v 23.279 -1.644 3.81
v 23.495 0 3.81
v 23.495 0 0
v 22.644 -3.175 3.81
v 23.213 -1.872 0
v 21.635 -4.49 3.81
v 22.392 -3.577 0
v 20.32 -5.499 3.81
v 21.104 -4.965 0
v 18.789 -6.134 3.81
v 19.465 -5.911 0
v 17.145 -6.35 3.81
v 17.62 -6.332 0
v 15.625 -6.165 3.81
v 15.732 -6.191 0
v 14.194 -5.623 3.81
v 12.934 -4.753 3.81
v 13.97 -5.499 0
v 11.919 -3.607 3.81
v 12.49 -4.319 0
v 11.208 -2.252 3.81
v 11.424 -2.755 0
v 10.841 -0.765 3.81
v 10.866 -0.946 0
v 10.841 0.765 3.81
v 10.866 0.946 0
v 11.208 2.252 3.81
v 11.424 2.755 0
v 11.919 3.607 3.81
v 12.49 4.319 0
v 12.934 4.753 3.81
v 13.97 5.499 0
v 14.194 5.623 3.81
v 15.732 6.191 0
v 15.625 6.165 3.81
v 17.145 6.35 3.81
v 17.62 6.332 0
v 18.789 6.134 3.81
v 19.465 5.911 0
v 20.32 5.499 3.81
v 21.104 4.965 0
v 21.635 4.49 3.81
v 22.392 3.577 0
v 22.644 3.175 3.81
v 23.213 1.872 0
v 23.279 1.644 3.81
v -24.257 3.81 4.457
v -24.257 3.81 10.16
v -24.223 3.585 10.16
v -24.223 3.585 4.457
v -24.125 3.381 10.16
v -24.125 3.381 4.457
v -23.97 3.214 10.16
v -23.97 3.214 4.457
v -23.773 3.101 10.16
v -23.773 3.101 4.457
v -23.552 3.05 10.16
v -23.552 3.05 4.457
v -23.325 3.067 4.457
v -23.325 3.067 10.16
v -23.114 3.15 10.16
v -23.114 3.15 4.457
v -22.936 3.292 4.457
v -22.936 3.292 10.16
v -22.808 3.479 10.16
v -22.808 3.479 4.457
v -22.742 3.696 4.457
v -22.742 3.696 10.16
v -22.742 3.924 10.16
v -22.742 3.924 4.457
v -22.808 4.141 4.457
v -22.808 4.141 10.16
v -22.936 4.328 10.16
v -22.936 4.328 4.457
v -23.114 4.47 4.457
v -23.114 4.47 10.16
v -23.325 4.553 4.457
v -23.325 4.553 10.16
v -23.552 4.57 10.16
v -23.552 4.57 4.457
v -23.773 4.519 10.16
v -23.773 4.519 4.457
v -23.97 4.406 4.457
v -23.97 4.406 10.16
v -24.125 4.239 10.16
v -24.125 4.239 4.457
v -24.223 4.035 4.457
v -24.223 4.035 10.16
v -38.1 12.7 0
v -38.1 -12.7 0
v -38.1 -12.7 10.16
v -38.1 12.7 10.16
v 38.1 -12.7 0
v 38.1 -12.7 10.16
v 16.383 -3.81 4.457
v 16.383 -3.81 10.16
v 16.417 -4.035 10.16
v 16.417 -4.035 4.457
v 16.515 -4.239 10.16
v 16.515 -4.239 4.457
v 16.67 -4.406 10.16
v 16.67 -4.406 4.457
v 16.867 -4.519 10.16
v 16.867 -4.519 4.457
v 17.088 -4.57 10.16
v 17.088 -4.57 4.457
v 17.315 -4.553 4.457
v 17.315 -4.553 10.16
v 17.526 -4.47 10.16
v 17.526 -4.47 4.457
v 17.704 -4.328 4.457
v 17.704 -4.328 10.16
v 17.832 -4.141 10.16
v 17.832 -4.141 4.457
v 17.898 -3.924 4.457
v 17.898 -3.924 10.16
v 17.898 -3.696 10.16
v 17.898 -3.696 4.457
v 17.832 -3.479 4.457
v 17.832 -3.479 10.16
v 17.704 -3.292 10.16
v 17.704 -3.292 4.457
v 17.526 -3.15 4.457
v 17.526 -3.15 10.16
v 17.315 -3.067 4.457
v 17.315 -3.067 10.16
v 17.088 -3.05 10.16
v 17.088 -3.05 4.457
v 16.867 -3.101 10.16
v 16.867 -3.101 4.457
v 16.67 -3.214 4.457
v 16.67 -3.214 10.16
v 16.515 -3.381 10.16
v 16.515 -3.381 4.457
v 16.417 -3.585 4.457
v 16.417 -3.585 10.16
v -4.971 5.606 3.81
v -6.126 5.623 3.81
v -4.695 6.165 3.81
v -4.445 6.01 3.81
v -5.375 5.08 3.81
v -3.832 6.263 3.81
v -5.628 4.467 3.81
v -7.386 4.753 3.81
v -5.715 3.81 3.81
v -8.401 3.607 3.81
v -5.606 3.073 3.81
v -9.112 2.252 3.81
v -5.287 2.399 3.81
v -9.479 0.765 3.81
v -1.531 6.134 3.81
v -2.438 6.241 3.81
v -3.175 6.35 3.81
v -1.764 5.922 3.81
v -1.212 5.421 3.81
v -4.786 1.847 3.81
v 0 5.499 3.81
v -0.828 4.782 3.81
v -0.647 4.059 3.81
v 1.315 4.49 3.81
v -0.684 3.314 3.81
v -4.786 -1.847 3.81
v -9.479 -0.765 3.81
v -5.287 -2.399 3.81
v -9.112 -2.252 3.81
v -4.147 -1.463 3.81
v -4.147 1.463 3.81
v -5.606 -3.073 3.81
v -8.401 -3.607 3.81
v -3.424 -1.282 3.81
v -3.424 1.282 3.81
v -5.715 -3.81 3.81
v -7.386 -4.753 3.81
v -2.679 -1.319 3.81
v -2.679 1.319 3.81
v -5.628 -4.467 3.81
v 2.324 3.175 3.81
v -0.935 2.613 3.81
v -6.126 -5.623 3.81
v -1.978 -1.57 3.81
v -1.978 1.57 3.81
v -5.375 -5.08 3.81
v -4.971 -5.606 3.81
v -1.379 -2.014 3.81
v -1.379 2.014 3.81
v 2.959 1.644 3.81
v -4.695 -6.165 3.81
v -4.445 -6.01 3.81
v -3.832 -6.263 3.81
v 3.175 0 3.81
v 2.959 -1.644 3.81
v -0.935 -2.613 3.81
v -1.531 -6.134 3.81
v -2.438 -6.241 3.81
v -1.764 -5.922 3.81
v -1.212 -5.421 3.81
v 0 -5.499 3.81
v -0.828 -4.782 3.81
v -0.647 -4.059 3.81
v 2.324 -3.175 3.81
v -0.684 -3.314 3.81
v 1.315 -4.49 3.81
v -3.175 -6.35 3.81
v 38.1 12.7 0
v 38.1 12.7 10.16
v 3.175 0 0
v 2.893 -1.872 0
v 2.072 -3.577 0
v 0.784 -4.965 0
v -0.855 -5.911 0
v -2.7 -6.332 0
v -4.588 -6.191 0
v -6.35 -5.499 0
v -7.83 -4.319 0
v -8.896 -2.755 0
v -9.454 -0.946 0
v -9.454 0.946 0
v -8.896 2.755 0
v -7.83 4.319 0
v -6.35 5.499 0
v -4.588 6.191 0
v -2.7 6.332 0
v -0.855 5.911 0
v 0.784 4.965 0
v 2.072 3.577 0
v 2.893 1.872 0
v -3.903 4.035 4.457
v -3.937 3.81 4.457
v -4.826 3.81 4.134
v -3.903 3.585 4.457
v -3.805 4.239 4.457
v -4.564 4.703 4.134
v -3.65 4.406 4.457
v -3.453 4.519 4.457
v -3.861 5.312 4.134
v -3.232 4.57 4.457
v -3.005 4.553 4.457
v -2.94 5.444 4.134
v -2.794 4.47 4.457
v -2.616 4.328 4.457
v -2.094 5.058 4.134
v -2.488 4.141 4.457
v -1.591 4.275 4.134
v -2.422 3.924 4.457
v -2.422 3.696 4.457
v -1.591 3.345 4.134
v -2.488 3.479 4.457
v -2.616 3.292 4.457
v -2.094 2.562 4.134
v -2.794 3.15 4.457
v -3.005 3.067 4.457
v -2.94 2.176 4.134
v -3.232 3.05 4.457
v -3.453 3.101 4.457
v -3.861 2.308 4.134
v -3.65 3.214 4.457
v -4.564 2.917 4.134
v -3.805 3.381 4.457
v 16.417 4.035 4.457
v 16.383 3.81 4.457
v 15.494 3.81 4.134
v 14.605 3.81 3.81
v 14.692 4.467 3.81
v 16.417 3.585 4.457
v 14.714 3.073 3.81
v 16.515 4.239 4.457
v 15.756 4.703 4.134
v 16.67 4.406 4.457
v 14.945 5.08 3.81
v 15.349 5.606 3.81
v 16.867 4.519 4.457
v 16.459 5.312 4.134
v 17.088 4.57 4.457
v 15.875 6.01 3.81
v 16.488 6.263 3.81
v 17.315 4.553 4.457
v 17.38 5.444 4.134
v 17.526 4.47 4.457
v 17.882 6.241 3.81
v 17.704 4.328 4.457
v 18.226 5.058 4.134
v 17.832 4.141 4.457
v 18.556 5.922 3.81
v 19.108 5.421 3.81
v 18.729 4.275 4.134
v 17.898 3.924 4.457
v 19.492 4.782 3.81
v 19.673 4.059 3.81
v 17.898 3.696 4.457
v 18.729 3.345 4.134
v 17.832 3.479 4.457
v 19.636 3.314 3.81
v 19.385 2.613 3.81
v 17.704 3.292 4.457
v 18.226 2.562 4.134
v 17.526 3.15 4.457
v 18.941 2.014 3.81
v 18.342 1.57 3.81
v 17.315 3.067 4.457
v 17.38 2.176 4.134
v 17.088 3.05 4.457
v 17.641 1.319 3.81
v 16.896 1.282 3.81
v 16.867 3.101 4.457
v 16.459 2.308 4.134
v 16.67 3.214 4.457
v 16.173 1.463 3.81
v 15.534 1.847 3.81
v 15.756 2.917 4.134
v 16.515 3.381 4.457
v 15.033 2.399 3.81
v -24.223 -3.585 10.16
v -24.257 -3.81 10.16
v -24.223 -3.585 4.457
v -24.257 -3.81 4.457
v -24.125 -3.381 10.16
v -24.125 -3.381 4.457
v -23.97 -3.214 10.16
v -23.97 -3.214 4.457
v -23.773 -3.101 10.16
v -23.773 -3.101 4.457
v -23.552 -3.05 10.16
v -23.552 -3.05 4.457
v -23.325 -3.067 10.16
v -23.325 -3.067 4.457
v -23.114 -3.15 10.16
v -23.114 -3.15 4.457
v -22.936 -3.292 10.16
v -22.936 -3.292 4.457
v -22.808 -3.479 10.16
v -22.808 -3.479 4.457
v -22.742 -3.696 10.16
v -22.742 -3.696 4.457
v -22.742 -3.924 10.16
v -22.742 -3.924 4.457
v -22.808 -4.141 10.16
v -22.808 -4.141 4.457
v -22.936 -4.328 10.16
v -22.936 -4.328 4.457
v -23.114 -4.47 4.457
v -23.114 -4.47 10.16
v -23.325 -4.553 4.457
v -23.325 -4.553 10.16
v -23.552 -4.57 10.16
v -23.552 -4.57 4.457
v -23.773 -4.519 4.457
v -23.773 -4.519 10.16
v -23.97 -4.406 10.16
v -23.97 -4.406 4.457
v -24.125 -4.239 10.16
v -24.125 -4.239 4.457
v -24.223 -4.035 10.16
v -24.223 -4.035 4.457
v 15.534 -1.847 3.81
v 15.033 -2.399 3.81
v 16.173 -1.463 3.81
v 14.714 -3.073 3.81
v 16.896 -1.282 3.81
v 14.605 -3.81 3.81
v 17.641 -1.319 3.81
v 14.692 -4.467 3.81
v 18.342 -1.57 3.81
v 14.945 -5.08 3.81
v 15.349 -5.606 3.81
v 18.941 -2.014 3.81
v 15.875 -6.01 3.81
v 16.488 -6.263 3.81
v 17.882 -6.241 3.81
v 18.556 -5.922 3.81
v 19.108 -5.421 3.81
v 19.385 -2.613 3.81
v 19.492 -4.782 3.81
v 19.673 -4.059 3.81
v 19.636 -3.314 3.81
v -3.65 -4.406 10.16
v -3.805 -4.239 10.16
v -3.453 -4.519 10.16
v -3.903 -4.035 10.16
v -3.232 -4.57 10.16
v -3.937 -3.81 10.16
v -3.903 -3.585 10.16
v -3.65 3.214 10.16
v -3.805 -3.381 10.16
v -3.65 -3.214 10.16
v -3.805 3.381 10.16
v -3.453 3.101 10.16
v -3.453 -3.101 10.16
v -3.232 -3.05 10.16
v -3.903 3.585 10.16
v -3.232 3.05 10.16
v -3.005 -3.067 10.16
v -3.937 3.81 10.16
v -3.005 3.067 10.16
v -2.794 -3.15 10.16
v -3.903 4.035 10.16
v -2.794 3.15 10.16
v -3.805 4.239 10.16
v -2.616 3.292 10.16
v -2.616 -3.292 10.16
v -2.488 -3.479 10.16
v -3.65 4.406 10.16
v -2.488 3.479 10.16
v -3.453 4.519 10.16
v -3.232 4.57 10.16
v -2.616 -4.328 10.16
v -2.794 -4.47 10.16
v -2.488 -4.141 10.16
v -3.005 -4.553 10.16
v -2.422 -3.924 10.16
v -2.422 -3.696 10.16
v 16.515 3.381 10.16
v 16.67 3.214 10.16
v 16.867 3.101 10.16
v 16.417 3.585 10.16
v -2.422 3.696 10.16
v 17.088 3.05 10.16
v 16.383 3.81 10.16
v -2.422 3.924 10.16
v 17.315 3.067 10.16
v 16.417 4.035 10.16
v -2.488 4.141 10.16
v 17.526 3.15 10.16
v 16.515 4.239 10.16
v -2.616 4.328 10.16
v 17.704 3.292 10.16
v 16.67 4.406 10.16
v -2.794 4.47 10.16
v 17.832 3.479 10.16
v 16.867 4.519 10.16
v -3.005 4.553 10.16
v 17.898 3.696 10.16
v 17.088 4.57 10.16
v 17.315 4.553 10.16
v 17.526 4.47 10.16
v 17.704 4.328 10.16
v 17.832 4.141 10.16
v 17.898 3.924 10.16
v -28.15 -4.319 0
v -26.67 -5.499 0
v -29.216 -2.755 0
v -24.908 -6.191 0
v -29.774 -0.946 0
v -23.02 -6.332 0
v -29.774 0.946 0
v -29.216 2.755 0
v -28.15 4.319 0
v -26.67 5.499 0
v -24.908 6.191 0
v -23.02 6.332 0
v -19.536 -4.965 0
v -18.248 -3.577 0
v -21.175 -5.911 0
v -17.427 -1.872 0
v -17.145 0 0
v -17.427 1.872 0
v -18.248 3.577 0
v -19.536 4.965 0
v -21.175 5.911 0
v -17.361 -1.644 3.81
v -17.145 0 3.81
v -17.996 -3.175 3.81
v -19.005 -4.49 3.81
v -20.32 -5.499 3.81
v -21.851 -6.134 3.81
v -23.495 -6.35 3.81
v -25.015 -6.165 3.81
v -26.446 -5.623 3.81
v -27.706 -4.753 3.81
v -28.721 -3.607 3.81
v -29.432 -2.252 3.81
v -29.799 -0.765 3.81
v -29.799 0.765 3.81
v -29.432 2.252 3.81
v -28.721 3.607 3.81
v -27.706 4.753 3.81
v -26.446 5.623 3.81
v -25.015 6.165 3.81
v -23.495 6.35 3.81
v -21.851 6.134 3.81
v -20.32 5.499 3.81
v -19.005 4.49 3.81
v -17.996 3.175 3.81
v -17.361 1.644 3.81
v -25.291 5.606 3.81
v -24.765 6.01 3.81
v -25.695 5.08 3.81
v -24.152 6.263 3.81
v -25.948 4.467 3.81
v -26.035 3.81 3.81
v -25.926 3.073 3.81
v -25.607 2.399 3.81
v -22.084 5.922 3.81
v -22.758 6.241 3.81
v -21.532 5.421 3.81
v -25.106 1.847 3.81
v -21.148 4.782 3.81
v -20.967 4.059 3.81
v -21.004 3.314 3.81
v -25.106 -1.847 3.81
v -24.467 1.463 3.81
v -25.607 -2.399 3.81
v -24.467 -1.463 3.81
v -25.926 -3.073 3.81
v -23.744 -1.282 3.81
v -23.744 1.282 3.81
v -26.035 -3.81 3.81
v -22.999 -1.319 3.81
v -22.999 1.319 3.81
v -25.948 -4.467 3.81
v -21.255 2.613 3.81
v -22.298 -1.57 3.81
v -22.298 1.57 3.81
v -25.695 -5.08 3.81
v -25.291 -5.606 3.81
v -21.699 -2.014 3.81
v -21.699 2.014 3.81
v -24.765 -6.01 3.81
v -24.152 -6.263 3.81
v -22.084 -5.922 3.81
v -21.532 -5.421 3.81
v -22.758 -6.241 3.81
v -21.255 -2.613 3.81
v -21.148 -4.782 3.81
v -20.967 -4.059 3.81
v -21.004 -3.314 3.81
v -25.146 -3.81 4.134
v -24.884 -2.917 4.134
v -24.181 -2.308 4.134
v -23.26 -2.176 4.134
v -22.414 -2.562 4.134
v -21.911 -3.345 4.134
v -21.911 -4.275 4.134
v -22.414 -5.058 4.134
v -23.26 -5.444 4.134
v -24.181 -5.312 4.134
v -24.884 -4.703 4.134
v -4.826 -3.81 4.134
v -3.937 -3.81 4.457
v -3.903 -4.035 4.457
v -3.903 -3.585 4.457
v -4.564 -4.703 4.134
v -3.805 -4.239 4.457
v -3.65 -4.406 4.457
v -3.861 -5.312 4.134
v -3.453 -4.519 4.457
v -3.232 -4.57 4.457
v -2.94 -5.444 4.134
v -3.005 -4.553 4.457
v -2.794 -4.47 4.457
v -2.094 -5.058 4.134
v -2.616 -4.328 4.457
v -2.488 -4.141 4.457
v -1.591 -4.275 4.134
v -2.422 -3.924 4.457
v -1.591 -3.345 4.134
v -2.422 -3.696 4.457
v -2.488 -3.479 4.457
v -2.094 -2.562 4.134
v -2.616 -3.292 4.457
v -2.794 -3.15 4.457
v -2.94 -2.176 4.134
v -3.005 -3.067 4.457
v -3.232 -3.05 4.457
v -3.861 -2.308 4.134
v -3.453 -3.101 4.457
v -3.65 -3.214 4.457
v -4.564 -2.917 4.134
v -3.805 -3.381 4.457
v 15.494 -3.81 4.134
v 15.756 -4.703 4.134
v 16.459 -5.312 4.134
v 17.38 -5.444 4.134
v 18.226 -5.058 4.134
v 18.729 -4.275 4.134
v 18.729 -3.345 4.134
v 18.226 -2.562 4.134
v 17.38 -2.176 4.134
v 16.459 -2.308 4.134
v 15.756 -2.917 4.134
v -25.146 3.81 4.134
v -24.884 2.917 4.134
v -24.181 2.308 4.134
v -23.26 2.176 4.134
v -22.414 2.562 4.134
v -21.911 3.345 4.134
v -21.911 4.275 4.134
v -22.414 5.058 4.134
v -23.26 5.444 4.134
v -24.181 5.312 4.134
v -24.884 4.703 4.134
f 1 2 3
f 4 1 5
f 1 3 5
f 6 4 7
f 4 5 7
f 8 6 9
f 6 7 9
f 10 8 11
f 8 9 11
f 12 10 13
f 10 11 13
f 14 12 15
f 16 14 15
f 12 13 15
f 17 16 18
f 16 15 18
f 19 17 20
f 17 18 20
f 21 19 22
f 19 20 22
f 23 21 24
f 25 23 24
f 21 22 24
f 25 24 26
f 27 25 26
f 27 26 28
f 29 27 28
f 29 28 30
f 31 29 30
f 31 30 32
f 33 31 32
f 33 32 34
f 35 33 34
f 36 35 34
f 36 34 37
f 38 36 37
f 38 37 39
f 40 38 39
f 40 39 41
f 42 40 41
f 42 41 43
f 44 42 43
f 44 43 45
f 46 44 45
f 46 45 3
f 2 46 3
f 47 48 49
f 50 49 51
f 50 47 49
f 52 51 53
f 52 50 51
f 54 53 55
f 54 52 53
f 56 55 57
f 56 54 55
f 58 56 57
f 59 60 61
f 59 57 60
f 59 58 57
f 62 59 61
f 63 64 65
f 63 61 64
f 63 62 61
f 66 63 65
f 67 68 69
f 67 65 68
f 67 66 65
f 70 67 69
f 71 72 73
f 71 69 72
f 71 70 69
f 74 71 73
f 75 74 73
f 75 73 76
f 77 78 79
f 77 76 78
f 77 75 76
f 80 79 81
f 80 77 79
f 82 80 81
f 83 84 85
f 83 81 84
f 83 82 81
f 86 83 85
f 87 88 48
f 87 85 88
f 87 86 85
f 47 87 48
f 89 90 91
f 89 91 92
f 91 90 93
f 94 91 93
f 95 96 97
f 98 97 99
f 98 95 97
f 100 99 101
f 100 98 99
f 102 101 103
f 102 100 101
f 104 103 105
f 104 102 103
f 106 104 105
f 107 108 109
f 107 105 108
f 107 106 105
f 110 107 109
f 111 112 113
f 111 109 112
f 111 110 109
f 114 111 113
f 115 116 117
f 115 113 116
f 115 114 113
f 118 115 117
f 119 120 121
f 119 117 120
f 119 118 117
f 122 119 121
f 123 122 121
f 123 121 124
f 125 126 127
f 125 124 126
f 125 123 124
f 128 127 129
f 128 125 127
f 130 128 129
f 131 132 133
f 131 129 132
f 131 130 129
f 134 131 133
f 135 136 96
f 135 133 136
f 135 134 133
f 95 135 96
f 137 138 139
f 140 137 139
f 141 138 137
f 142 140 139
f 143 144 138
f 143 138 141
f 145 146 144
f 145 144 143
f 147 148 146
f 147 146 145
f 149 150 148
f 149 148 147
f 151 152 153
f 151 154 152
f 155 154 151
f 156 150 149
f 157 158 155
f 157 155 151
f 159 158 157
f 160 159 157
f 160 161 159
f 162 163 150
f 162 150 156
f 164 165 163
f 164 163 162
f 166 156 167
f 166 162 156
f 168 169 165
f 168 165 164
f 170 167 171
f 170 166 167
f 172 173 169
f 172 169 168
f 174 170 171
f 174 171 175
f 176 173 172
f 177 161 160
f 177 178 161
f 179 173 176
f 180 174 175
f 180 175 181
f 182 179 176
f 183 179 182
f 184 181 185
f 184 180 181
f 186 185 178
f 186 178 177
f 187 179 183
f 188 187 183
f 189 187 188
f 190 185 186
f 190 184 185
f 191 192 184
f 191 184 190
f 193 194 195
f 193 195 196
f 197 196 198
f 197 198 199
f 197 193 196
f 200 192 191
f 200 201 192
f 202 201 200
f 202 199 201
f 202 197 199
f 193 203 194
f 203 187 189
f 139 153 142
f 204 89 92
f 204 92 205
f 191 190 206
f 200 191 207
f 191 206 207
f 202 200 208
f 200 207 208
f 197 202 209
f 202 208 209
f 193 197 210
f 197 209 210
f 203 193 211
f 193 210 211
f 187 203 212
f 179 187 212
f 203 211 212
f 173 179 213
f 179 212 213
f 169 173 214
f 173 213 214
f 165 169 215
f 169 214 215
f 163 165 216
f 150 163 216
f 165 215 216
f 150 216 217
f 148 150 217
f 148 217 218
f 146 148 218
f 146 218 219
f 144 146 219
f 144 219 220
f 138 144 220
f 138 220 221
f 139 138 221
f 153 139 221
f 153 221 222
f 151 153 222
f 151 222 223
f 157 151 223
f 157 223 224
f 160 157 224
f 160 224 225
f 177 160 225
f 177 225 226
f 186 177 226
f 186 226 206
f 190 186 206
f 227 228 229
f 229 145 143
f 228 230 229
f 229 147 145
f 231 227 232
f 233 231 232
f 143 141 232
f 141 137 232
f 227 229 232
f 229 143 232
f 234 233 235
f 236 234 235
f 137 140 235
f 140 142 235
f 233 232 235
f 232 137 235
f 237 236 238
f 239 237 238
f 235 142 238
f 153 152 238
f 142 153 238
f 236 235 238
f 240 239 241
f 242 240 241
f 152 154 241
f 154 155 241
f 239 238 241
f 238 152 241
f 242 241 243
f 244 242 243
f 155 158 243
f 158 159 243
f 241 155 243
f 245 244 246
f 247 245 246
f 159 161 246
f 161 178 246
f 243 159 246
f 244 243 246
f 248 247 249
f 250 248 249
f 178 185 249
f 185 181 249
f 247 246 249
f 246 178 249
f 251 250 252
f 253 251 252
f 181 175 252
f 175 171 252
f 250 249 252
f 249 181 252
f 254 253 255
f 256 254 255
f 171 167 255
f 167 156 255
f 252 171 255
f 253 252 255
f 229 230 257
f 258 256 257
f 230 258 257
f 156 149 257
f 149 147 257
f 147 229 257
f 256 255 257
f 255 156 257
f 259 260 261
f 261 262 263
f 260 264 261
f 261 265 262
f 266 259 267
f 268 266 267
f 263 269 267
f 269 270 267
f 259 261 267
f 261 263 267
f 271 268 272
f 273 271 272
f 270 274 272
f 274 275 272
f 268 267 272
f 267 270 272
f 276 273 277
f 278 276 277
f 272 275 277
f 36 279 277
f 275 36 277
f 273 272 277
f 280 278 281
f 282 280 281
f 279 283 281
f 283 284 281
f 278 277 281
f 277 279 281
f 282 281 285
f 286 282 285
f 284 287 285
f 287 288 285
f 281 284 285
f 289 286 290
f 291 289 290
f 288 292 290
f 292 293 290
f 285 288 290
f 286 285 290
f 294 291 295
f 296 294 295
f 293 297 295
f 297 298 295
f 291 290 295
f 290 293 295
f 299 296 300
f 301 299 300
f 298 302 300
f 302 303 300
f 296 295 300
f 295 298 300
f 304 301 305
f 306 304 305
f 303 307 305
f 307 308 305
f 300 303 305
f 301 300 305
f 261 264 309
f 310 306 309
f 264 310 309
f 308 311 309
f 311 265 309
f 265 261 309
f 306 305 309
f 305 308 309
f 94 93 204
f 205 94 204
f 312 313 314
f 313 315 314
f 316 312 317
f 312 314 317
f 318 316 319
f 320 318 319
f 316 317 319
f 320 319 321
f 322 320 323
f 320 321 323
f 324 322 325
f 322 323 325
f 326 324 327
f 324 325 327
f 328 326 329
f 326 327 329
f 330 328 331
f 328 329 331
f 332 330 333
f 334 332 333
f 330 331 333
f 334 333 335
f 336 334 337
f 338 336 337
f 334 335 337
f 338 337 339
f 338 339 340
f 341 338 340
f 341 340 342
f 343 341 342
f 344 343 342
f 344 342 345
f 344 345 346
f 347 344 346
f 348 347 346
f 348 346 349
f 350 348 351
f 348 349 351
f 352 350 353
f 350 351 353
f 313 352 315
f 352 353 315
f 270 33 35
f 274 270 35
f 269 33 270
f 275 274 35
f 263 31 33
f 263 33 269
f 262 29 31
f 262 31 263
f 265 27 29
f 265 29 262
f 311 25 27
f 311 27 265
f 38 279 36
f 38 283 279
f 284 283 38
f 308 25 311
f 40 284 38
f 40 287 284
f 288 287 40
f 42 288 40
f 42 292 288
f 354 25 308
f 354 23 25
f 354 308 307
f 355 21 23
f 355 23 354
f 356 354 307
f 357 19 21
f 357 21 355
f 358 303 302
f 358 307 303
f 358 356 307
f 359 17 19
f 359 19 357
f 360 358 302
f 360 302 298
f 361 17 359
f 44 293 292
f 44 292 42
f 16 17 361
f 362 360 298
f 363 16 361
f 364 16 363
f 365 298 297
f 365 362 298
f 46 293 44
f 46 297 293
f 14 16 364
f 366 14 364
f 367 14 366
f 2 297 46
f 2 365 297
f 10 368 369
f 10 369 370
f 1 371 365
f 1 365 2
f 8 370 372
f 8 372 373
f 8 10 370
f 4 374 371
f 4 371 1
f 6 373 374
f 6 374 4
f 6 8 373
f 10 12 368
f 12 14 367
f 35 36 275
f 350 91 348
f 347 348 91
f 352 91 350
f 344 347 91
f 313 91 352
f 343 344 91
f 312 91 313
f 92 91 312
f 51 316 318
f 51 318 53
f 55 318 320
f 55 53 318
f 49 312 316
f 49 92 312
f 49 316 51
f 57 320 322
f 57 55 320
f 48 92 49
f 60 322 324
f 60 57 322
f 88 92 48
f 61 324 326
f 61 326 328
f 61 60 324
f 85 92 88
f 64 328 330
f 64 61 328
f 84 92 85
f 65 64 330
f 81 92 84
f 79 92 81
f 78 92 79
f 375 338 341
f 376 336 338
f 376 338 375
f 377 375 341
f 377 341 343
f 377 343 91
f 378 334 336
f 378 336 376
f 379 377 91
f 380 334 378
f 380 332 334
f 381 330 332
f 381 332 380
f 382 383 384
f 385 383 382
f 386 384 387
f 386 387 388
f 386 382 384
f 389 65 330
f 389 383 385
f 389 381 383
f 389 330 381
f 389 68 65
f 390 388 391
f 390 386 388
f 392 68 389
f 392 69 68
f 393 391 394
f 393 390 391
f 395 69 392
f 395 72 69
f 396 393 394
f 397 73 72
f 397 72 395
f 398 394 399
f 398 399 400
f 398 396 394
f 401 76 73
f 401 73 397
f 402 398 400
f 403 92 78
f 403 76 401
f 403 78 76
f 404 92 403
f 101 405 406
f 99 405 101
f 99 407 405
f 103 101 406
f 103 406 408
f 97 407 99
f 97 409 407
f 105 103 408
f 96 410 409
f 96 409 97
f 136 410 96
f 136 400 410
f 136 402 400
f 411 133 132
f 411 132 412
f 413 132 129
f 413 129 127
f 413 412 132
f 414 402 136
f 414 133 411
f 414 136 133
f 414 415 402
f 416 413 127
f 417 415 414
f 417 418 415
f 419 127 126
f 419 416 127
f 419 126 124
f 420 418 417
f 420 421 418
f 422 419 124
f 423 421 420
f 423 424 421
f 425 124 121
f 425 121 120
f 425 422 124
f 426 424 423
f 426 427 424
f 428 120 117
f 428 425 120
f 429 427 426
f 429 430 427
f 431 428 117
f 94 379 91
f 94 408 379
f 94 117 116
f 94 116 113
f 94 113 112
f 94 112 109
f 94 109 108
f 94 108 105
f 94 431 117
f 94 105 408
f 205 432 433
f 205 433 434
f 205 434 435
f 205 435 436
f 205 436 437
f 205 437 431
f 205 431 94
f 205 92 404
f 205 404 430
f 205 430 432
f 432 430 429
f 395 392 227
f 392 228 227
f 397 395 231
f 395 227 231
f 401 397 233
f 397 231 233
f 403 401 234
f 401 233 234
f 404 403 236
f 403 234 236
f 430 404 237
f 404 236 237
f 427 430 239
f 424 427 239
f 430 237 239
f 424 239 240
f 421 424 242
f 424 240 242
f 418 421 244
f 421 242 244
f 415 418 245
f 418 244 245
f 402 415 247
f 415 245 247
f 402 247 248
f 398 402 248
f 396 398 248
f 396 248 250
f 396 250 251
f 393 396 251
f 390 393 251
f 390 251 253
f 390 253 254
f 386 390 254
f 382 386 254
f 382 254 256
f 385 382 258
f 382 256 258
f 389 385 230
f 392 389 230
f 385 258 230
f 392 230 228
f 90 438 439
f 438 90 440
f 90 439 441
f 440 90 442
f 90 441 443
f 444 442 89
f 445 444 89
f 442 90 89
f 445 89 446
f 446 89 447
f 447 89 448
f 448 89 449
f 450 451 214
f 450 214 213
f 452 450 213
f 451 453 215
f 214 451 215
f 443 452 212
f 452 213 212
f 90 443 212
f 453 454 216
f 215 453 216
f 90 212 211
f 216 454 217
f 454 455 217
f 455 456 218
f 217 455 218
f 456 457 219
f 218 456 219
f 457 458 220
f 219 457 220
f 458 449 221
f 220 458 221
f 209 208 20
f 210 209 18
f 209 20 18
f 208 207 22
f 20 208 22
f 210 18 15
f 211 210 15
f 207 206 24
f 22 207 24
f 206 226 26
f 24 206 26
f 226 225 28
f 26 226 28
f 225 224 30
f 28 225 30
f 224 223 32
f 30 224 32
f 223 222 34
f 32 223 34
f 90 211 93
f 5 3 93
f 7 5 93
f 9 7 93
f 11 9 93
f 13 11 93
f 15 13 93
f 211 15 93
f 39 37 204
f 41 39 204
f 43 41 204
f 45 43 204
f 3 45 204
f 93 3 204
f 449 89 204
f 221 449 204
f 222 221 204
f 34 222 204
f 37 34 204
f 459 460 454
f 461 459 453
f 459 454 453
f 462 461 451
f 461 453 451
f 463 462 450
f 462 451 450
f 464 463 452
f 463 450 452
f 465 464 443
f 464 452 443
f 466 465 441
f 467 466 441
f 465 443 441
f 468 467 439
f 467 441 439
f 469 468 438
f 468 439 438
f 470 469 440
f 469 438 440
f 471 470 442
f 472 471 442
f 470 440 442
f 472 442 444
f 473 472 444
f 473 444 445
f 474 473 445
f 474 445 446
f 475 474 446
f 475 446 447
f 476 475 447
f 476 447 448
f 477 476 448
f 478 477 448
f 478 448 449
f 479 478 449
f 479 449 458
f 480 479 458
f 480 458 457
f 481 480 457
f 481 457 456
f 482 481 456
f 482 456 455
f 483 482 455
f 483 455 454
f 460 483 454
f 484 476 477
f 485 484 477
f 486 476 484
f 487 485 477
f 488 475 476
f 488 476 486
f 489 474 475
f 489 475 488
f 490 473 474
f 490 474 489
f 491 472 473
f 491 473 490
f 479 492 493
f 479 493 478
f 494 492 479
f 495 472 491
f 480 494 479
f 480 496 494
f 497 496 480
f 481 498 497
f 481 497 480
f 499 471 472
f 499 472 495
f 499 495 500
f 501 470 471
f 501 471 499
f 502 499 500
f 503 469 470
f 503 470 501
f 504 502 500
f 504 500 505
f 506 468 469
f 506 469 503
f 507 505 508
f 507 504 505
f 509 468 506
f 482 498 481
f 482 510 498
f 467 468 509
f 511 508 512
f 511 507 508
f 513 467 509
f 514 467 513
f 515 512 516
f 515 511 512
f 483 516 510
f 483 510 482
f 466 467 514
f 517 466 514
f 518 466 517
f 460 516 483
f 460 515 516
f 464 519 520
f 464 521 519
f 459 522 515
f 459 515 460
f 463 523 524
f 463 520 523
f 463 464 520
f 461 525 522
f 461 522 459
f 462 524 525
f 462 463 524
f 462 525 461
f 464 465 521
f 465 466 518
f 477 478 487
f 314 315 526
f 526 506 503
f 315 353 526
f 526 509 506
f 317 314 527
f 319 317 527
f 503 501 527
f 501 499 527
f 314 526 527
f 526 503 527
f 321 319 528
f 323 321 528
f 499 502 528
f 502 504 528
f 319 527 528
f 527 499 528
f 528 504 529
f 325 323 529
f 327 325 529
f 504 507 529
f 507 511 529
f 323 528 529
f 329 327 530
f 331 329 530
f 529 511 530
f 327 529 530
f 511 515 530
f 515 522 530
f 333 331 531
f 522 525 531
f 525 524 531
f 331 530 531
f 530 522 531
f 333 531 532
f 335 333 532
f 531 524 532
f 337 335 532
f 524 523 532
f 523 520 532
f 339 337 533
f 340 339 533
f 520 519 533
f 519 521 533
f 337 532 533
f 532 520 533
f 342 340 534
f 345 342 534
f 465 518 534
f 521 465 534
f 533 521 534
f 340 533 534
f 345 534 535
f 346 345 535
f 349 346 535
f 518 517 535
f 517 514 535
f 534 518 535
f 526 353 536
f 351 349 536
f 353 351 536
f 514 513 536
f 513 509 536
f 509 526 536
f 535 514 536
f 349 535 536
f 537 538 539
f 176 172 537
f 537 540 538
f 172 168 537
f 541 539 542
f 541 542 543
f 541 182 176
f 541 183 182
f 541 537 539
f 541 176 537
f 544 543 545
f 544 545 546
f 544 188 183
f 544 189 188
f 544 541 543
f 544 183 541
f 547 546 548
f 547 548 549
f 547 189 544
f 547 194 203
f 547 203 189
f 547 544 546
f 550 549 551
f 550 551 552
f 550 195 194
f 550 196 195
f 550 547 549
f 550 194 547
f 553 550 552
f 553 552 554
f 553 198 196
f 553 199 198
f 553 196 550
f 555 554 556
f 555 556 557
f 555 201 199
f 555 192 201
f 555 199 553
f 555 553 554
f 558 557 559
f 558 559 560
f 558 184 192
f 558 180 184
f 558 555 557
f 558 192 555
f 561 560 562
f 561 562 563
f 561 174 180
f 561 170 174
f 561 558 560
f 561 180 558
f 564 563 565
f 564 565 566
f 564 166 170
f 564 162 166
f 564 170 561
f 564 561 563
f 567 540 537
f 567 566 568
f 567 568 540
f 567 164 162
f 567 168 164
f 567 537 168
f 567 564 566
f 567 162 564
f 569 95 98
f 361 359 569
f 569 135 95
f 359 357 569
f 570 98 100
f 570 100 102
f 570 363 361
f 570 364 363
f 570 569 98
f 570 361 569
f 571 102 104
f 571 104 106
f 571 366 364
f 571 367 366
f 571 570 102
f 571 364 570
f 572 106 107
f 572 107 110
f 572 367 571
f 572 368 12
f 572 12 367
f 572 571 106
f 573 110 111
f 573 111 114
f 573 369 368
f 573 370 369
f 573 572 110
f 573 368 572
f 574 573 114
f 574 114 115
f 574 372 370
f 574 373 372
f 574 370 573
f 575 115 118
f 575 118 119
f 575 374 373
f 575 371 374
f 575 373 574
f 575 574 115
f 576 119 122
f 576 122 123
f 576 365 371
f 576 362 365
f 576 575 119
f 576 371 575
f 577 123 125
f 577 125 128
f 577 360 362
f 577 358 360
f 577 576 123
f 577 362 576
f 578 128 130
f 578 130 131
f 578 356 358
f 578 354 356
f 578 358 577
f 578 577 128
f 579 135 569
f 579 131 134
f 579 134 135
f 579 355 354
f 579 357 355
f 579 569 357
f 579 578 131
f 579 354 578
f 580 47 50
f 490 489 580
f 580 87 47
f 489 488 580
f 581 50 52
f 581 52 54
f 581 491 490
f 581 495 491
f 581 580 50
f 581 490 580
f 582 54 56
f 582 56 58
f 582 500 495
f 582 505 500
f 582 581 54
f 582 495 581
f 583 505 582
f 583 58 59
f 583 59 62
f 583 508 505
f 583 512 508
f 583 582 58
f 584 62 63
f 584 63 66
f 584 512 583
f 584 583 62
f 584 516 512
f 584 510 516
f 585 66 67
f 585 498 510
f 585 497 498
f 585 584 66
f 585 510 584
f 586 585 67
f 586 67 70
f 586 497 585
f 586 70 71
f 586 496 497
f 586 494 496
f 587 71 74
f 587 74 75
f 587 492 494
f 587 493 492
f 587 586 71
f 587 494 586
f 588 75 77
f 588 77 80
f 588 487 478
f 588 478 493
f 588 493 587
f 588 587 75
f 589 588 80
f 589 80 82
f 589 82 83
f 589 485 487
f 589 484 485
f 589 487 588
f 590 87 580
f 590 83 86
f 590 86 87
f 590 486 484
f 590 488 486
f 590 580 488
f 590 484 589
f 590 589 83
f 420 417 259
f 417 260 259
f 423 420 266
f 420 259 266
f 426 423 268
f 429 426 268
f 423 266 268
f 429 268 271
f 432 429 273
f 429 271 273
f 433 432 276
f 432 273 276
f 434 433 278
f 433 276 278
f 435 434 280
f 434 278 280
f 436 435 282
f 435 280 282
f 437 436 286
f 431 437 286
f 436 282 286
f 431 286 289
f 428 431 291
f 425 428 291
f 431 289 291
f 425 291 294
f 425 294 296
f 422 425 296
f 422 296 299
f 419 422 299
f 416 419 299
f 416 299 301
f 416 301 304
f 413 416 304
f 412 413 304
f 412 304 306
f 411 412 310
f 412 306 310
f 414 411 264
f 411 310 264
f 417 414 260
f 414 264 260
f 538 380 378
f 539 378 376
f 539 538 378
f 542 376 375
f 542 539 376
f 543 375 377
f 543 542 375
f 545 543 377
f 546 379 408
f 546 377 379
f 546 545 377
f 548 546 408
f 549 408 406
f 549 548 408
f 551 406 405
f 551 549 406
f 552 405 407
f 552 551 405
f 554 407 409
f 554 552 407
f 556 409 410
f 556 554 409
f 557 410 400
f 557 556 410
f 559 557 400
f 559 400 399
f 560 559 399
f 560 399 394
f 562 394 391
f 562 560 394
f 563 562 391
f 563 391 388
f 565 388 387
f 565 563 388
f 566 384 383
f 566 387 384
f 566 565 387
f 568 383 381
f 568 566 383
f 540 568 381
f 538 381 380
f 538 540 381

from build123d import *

# Parameters (mm, degrees)
F0_W     = 76.2
F0_H     = 25.4
F1_DEPTH = 10.16
F2_R     = 6.35
F3_DEPTH = 3.81


# Not quite as in the source:
# - a pattern or mirror of a feature is missing from the dataset's text; its kind, count and spacing are read off the source's solid


with BuildPart() as f1:
    # F0 (on Top) → F1 (new body)
    with BuildSketch(Plane.XY):
        Rectangle(F0_W, F0_H)
    extrude(amount=F1_DEPTH)

    # F2 (on face) → F3 (cut)
    with BuildSketch(Plane(origin=(0, 0, 0), x_dir=(1, 0, 0), z_dir=(0, 0, -1))):
        with Locations((-23.495, 0)):
            Circle(F2_R)
        with Locations((-3.175, 0)):
            Circle(F2_R)
        with Locations((17.145, 0)):
            Circle(F2_R)
    extrude(amount=-F3_DEPTH, mode=Mode.SUBTRACT)

    # F5 (on offset) → F6 (revolve, cut)
    with BuildSketch(Plane.XZ.offset(3.81)):
        Polygon((-26.035, 3.81), (-23.495, 3.81), (-23.495, 10.4205608368), (-24.257, 10.4205608368), (-24.257, 4.4571390765), align=None)
    f6 = revolve(axis=Axis((-23.495, -3.81, 7.1152804184), (0, 0, -1)), mode=Mode.SUBTRACT)

    # F6_copies: F6 across plane
    add(f6.mirror(Plane.ZX), mode=Mode.SUBTRACT)

    # F7 (on offset) → F8 (revolve, cut)
    with BuildSketch(Plane.XZ.offset(3.81)):
        Polygon((-5.715, 3.81), (-3.175, 3.81), (-3.175, 10.4205607442), (-3.937, 10.4205607442), (-3.937, 4.4571389839), align=None)
    f8 = revolve(axis=Axis((-3.175, -3.81, 10.0472030926), (0, 0, 1)), mode=Mode.SUBTRACT)

    # F8_copies: F8 across plane
    add(f8.mirror(Plane.ZX), mode=Mode.SUBTRACT)

    # F9 (on offset) → F10 (revolve, cut)
    with BuildSketch(Plane.XZ.offset(3.81)):
        Polygon((14.605, 3.81), (17.145, 3.81), (17.145, 10.4205608368), (16.383, 10.4205608368), (16.383, 4.4571390765), align=None)
    f10 = revolve(axis=Axis((17.145, -3.81, 8.0366932552), (0, 0, 1)), mode=Mode.SUBTRACT)

    # F10_copies: F10 across plane
    add(f10.mirror(Plane.ZX), mode=Mode.SUBTRACT)


solid = f1.part
